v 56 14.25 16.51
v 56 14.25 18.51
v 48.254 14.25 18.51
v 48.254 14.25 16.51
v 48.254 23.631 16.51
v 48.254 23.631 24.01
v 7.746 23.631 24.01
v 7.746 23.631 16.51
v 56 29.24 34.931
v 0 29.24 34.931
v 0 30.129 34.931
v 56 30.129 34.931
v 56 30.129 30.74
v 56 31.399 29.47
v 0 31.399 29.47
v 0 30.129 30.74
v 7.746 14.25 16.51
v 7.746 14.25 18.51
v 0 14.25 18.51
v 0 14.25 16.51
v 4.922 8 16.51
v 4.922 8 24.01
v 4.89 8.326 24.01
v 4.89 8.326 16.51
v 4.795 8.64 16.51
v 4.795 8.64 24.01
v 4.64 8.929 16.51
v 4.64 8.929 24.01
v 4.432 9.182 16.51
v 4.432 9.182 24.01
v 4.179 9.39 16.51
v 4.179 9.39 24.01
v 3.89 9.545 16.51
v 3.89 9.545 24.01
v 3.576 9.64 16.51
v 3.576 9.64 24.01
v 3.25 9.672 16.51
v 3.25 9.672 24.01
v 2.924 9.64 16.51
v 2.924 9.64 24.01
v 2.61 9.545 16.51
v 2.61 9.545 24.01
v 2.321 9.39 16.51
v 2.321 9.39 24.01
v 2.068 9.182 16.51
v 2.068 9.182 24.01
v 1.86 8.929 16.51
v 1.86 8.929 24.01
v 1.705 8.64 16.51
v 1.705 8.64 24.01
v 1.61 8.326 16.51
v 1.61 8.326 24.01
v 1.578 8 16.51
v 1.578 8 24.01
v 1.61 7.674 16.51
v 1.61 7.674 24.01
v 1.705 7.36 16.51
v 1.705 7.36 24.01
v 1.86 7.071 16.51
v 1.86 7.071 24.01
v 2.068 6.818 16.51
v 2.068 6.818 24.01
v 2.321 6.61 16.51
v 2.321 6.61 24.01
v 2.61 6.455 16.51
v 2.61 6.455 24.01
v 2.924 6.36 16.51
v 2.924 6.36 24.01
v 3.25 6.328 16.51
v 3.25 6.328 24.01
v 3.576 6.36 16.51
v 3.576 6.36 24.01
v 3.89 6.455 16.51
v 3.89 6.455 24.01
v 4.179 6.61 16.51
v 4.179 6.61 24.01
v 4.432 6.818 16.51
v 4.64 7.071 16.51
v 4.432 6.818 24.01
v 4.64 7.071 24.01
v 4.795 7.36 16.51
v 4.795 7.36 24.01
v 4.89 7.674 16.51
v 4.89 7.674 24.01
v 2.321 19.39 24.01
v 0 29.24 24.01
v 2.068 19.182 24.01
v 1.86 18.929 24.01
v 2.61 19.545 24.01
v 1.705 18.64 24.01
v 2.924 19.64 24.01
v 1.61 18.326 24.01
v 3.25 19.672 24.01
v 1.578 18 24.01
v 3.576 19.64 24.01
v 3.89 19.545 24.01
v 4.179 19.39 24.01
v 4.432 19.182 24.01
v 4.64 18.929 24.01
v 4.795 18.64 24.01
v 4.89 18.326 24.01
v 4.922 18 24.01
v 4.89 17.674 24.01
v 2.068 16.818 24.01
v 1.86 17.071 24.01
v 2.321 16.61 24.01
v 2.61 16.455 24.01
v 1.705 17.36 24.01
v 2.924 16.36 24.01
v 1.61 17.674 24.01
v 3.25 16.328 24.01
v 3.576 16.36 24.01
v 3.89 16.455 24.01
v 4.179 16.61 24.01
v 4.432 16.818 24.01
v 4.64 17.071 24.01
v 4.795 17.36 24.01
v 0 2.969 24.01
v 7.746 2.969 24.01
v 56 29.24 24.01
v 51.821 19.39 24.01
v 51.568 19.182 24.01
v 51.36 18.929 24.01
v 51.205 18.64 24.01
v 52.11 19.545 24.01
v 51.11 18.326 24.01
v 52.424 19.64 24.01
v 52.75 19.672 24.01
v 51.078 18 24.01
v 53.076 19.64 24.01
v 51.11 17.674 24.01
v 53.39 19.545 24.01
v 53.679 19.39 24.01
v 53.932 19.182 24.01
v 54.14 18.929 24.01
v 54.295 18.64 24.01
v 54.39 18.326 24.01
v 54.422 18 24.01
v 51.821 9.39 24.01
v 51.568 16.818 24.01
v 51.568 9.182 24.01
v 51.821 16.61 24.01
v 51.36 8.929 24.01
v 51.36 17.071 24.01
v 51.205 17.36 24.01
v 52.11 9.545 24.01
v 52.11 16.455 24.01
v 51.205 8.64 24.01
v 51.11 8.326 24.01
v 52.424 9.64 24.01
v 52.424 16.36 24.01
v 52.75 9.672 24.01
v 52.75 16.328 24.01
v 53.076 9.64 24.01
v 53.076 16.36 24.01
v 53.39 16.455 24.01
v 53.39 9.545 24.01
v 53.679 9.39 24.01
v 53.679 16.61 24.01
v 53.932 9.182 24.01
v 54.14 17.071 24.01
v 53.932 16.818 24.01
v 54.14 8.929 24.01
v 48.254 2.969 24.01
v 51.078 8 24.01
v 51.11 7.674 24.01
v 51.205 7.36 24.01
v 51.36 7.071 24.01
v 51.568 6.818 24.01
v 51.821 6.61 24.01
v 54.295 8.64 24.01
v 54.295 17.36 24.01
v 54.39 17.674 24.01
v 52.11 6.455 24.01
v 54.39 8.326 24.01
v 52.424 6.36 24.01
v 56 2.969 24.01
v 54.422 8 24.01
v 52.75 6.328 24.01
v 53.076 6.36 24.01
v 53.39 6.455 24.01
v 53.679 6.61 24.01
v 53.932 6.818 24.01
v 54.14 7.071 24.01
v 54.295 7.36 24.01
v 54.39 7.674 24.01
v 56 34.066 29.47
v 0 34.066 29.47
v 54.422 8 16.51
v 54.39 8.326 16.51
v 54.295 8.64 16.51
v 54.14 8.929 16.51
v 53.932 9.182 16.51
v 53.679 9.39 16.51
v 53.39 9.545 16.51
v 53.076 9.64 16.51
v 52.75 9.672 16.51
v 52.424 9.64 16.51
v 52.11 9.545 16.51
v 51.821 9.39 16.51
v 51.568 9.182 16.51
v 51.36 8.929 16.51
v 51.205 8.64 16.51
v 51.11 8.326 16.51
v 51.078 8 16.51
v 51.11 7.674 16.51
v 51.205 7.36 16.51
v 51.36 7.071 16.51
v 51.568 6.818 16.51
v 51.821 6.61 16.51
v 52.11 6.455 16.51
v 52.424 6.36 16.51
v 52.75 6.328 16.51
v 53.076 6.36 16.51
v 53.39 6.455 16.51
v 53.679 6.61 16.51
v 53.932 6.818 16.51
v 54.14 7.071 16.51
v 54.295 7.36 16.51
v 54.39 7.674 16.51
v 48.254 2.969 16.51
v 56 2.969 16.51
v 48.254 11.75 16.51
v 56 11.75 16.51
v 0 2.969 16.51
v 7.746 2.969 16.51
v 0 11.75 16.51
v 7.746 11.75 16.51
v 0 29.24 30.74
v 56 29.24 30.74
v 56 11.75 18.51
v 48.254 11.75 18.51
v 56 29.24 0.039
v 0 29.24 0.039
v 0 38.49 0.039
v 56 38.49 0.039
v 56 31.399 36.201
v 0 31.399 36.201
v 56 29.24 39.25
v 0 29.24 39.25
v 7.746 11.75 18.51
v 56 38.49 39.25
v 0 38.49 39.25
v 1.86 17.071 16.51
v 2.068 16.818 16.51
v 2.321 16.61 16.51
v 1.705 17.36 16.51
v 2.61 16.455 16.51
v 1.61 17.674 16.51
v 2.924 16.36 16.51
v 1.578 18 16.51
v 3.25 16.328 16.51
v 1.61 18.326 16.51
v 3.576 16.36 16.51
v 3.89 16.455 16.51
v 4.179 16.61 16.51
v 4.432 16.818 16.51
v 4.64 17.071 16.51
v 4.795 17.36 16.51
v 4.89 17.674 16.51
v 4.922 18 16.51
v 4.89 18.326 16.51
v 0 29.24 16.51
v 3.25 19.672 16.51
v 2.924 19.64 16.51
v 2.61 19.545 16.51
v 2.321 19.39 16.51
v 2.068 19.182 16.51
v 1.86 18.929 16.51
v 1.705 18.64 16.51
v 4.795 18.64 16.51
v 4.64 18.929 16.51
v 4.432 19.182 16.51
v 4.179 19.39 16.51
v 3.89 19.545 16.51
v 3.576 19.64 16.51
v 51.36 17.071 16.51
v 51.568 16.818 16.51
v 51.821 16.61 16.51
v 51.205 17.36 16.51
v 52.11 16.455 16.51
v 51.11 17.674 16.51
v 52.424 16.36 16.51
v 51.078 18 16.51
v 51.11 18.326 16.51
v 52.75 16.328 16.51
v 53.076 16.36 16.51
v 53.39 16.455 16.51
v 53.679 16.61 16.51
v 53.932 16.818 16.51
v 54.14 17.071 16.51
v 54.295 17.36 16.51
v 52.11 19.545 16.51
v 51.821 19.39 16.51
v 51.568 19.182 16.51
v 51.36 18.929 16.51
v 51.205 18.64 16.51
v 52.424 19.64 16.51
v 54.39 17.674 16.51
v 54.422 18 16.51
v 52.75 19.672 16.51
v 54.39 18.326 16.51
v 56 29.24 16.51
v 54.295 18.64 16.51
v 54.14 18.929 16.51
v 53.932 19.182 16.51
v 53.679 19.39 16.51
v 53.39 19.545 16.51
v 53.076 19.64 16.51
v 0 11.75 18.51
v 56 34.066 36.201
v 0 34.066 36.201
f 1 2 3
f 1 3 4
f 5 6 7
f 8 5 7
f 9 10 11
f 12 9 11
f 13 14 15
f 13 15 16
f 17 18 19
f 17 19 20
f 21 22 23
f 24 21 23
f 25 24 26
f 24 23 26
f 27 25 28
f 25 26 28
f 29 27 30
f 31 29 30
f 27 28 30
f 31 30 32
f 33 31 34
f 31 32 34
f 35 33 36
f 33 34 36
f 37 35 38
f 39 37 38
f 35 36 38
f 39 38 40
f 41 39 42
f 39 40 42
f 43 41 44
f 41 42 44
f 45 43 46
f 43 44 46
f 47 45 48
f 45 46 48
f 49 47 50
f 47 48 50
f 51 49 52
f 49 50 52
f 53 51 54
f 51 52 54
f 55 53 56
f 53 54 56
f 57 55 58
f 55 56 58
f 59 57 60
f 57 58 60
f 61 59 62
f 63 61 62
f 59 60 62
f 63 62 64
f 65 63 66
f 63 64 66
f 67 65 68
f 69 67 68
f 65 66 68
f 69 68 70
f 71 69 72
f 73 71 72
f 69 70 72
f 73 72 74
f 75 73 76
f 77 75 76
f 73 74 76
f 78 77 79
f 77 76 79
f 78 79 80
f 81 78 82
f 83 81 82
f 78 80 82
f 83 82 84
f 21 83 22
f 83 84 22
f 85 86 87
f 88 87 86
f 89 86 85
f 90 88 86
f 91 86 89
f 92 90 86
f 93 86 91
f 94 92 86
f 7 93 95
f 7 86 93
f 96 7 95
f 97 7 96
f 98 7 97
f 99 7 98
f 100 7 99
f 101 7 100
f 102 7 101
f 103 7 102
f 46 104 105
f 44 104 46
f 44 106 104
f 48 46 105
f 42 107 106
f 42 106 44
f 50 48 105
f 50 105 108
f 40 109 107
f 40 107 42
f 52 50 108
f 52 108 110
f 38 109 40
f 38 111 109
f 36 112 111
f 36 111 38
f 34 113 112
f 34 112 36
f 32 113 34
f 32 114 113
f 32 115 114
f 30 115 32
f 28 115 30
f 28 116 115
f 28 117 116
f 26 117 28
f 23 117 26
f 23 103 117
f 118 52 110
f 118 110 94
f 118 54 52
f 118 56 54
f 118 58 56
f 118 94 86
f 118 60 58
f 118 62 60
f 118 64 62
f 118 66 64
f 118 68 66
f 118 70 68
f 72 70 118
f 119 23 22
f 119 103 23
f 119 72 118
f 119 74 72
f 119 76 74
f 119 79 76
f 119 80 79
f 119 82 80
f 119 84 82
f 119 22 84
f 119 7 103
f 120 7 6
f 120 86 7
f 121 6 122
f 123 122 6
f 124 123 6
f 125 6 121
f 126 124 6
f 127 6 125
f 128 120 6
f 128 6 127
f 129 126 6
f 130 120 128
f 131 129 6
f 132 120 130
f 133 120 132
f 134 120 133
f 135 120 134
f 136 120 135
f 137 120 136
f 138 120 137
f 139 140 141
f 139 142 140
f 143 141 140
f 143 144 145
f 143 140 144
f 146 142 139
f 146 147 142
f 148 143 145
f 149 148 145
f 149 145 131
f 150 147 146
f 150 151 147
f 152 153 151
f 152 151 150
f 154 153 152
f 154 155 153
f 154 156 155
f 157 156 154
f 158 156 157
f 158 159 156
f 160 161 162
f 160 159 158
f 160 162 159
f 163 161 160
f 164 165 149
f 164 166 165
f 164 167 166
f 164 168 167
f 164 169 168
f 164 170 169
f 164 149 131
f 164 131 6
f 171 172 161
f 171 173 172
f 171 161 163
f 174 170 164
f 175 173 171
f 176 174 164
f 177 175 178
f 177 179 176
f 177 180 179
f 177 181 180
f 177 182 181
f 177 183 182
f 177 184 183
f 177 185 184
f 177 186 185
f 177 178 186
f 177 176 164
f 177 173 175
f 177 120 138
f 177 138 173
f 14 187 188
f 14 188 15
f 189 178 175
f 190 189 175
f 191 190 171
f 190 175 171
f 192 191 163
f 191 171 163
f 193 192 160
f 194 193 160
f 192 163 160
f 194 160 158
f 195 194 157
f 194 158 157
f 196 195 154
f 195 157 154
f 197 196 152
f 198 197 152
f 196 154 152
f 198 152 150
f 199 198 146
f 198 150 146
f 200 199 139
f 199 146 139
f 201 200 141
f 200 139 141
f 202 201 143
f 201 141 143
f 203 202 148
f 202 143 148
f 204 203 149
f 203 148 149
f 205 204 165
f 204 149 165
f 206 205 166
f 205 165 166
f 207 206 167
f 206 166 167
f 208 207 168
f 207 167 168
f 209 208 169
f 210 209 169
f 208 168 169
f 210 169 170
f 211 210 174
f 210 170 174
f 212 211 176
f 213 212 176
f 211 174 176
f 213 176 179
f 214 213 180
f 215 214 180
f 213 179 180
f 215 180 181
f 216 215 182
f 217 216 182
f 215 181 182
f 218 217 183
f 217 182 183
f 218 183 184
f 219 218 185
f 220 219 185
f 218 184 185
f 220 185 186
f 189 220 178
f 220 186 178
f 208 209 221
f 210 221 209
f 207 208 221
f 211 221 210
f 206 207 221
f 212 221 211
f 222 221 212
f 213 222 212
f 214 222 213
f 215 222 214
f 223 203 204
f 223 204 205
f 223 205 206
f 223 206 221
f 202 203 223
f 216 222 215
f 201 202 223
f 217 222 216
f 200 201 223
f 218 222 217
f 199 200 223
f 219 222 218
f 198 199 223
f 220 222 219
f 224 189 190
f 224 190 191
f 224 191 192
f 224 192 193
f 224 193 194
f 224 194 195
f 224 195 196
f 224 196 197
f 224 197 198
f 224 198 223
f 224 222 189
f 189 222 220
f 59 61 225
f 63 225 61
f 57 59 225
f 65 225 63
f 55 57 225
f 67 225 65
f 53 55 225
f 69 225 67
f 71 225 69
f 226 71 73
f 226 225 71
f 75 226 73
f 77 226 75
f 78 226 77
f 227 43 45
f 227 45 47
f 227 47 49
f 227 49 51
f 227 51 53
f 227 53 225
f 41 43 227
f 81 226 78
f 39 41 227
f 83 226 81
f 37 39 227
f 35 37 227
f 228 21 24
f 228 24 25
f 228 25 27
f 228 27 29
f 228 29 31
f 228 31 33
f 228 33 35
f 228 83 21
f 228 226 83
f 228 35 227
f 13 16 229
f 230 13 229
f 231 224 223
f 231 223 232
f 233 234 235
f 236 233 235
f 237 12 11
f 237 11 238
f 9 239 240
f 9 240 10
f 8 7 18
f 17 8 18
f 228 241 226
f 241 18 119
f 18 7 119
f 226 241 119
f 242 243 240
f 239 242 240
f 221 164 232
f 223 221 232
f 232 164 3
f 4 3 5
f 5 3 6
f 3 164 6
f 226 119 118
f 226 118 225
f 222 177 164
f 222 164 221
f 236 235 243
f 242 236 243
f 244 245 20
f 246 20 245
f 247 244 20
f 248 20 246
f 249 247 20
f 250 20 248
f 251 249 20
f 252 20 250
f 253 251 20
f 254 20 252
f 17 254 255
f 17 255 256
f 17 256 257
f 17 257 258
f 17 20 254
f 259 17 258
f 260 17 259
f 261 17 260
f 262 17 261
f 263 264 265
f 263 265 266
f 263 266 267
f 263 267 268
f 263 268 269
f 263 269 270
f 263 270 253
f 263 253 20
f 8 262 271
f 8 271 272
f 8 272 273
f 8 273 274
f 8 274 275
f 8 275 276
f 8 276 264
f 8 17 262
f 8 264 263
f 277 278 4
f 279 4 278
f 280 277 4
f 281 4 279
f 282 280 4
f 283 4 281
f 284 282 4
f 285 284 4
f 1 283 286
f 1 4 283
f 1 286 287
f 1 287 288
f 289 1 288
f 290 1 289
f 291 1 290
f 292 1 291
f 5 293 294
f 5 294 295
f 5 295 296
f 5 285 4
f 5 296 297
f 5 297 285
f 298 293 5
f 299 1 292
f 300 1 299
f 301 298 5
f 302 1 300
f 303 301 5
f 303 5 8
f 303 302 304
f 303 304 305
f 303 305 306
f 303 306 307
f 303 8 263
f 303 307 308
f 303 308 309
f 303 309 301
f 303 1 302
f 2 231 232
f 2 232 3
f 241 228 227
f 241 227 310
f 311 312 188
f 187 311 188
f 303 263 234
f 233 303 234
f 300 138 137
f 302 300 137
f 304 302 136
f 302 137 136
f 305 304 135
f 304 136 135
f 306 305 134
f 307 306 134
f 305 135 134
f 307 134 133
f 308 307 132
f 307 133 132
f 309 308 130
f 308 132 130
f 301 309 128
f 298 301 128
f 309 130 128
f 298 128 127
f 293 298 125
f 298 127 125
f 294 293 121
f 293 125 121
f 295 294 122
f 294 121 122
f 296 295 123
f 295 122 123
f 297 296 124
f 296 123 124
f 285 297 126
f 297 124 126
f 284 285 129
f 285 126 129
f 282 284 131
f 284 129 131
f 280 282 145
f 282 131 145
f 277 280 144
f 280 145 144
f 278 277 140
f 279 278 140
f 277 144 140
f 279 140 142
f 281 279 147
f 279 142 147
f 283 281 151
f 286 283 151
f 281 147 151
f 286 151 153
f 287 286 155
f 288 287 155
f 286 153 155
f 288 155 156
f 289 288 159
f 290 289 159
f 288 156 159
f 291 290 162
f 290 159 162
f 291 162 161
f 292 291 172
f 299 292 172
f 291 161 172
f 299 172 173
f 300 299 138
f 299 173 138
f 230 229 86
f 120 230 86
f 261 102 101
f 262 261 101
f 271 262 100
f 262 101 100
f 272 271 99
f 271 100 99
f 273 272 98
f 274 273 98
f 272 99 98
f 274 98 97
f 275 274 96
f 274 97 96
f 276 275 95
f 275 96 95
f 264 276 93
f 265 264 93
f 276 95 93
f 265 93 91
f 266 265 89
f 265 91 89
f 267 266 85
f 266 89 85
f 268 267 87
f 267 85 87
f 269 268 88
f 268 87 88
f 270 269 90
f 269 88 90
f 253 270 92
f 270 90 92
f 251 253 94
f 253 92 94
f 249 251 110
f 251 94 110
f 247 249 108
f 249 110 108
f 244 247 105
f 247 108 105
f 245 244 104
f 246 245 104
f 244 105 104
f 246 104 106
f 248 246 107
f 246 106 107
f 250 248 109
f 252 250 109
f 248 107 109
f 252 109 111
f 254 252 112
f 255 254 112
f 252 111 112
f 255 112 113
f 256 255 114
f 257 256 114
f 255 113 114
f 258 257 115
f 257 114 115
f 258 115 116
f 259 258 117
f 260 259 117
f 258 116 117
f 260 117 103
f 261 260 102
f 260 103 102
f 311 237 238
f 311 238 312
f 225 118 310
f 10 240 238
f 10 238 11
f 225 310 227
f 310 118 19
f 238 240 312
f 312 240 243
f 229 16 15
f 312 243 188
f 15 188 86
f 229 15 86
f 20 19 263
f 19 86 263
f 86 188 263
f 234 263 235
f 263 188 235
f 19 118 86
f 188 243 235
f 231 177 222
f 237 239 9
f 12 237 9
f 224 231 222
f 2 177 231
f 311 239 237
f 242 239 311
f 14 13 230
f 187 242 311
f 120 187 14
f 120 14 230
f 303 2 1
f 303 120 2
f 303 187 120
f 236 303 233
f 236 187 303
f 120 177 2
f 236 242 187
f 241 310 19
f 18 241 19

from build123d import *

# Parameters (mm, degrees)
BOSS_EXTRUDE1_DEPTH = 56
BOSS_EXTRUDE2_DEPTH = 56
CUT_EXTRUDE1_REACH  = 74.056
SKETCH6_R           = 1.672
CUT_EXTRUDE4_DEPTH  = 7.5


with BuildPart() as part:
    # Sketch2 → Boss-Extrude1 (new body)
    with BuildSketch(Plane(origin=(0, 0, 0), x_dir=(0, 0, -1), z_dir=(1, 0, 0))):
        Polygon((-39.250001311, 38.490001112), (-39.250001311, 29.240000993), (-34.930501133, 29.240000993), (-34.930501133, 30.129000545), (-36.200501025, 31.399000436), (-36.200501025, 34.065999091), (-29.469501227, 34.065999091), (-29.469501227, 31.399000436), (-30.739501119, 30.129000545), (-30.739501119, 29.240000993), (-0.03858842, 29.240000993), (-0.03858842, 38.490001112), align=None)
    extrude(amount=BOSS_EXTRUDE1_DEPTH)

    # Sketch3 → Boss-Extrude2 (add)
    with BuildSketch(Plane(origin=(56, 0, 0), x_dir=(0, 0, -1), z_dir=(1, 0, 0))):
        Polygon((-18.510001311, 29.240000993), (-24.010001311, 29.240000993), (-24.010001311, 2.969290993), (-16.510001311, 2.969290993), (-16.510001311, 11.750000993), (-18.510001311, 11.750000993), (-18.510001311, 14.250000993), (-16.510001311, 14.250000993), (-16.510001311, 29.240000993), align=None)
    extrude(amount=-BOSS_EXTRUDE2_DEPTH)

    # Cut-Extrude1: up to this face of the body (flat: up to its plane)
    cut_extrude1_end = Plane(part.part.faces().sort_by_distance((28, 21.745000993, 16.510001311))[0])
    # Sketch4 → Cut-Extrude1 (cut, up to the picked face)
    with BuildSketch(Plane.XY.offset(24.010001311), mode=Mode.PRIVATE) as cut_extrude1_sk1:
        Polygon((48.254, 23.631000993), (26.180665343, 23.631000993), (7.746, 23.631000993), (7.746, 20.223656135), (7.746, 7.540175529), (7.746, 2.969290993), (48.254, 2.969290993), (48.254, 20.898309359), align=None)
    cut_extrude1_tool1 = split(extrude(cut_extrude1_sk1.sketch, amount=-CUT_EXTRUDE1_REACH, mode=Mode.PRIVATE), bisect_by=cut_extrude1_end, keep=Keep.BOTH, mode=Mode.PRIVATE)
    add(cut_extrude1_tool1.solids().sort_by(Axis((28, 13.300146, 24.010001), (0, 0, -1)))[0], mode=Mode.SUBTRACT)

    # Sketch6 → Cut-Extrude4 (cut)
    with BuildSketch(Plane.XY.offset(24.010001311)):
        with Locations((3.25, 18.000000993)):
            Circle(SKETCH6_R)
        with Locations((3.25, 8.000000993)):
            Circle(SKETCH6_R)
        with Locations((52.75, 18.000000993)):
            Circle(SKETCH6_R)
        with Locations((52.75, 8.000000993)):
            Circle(SKETCH6_R)
    extrude(amount=-CUT_EXTRUDE4_DEPTH, mode=Mode.SUBTRACT)


solid = part.part
